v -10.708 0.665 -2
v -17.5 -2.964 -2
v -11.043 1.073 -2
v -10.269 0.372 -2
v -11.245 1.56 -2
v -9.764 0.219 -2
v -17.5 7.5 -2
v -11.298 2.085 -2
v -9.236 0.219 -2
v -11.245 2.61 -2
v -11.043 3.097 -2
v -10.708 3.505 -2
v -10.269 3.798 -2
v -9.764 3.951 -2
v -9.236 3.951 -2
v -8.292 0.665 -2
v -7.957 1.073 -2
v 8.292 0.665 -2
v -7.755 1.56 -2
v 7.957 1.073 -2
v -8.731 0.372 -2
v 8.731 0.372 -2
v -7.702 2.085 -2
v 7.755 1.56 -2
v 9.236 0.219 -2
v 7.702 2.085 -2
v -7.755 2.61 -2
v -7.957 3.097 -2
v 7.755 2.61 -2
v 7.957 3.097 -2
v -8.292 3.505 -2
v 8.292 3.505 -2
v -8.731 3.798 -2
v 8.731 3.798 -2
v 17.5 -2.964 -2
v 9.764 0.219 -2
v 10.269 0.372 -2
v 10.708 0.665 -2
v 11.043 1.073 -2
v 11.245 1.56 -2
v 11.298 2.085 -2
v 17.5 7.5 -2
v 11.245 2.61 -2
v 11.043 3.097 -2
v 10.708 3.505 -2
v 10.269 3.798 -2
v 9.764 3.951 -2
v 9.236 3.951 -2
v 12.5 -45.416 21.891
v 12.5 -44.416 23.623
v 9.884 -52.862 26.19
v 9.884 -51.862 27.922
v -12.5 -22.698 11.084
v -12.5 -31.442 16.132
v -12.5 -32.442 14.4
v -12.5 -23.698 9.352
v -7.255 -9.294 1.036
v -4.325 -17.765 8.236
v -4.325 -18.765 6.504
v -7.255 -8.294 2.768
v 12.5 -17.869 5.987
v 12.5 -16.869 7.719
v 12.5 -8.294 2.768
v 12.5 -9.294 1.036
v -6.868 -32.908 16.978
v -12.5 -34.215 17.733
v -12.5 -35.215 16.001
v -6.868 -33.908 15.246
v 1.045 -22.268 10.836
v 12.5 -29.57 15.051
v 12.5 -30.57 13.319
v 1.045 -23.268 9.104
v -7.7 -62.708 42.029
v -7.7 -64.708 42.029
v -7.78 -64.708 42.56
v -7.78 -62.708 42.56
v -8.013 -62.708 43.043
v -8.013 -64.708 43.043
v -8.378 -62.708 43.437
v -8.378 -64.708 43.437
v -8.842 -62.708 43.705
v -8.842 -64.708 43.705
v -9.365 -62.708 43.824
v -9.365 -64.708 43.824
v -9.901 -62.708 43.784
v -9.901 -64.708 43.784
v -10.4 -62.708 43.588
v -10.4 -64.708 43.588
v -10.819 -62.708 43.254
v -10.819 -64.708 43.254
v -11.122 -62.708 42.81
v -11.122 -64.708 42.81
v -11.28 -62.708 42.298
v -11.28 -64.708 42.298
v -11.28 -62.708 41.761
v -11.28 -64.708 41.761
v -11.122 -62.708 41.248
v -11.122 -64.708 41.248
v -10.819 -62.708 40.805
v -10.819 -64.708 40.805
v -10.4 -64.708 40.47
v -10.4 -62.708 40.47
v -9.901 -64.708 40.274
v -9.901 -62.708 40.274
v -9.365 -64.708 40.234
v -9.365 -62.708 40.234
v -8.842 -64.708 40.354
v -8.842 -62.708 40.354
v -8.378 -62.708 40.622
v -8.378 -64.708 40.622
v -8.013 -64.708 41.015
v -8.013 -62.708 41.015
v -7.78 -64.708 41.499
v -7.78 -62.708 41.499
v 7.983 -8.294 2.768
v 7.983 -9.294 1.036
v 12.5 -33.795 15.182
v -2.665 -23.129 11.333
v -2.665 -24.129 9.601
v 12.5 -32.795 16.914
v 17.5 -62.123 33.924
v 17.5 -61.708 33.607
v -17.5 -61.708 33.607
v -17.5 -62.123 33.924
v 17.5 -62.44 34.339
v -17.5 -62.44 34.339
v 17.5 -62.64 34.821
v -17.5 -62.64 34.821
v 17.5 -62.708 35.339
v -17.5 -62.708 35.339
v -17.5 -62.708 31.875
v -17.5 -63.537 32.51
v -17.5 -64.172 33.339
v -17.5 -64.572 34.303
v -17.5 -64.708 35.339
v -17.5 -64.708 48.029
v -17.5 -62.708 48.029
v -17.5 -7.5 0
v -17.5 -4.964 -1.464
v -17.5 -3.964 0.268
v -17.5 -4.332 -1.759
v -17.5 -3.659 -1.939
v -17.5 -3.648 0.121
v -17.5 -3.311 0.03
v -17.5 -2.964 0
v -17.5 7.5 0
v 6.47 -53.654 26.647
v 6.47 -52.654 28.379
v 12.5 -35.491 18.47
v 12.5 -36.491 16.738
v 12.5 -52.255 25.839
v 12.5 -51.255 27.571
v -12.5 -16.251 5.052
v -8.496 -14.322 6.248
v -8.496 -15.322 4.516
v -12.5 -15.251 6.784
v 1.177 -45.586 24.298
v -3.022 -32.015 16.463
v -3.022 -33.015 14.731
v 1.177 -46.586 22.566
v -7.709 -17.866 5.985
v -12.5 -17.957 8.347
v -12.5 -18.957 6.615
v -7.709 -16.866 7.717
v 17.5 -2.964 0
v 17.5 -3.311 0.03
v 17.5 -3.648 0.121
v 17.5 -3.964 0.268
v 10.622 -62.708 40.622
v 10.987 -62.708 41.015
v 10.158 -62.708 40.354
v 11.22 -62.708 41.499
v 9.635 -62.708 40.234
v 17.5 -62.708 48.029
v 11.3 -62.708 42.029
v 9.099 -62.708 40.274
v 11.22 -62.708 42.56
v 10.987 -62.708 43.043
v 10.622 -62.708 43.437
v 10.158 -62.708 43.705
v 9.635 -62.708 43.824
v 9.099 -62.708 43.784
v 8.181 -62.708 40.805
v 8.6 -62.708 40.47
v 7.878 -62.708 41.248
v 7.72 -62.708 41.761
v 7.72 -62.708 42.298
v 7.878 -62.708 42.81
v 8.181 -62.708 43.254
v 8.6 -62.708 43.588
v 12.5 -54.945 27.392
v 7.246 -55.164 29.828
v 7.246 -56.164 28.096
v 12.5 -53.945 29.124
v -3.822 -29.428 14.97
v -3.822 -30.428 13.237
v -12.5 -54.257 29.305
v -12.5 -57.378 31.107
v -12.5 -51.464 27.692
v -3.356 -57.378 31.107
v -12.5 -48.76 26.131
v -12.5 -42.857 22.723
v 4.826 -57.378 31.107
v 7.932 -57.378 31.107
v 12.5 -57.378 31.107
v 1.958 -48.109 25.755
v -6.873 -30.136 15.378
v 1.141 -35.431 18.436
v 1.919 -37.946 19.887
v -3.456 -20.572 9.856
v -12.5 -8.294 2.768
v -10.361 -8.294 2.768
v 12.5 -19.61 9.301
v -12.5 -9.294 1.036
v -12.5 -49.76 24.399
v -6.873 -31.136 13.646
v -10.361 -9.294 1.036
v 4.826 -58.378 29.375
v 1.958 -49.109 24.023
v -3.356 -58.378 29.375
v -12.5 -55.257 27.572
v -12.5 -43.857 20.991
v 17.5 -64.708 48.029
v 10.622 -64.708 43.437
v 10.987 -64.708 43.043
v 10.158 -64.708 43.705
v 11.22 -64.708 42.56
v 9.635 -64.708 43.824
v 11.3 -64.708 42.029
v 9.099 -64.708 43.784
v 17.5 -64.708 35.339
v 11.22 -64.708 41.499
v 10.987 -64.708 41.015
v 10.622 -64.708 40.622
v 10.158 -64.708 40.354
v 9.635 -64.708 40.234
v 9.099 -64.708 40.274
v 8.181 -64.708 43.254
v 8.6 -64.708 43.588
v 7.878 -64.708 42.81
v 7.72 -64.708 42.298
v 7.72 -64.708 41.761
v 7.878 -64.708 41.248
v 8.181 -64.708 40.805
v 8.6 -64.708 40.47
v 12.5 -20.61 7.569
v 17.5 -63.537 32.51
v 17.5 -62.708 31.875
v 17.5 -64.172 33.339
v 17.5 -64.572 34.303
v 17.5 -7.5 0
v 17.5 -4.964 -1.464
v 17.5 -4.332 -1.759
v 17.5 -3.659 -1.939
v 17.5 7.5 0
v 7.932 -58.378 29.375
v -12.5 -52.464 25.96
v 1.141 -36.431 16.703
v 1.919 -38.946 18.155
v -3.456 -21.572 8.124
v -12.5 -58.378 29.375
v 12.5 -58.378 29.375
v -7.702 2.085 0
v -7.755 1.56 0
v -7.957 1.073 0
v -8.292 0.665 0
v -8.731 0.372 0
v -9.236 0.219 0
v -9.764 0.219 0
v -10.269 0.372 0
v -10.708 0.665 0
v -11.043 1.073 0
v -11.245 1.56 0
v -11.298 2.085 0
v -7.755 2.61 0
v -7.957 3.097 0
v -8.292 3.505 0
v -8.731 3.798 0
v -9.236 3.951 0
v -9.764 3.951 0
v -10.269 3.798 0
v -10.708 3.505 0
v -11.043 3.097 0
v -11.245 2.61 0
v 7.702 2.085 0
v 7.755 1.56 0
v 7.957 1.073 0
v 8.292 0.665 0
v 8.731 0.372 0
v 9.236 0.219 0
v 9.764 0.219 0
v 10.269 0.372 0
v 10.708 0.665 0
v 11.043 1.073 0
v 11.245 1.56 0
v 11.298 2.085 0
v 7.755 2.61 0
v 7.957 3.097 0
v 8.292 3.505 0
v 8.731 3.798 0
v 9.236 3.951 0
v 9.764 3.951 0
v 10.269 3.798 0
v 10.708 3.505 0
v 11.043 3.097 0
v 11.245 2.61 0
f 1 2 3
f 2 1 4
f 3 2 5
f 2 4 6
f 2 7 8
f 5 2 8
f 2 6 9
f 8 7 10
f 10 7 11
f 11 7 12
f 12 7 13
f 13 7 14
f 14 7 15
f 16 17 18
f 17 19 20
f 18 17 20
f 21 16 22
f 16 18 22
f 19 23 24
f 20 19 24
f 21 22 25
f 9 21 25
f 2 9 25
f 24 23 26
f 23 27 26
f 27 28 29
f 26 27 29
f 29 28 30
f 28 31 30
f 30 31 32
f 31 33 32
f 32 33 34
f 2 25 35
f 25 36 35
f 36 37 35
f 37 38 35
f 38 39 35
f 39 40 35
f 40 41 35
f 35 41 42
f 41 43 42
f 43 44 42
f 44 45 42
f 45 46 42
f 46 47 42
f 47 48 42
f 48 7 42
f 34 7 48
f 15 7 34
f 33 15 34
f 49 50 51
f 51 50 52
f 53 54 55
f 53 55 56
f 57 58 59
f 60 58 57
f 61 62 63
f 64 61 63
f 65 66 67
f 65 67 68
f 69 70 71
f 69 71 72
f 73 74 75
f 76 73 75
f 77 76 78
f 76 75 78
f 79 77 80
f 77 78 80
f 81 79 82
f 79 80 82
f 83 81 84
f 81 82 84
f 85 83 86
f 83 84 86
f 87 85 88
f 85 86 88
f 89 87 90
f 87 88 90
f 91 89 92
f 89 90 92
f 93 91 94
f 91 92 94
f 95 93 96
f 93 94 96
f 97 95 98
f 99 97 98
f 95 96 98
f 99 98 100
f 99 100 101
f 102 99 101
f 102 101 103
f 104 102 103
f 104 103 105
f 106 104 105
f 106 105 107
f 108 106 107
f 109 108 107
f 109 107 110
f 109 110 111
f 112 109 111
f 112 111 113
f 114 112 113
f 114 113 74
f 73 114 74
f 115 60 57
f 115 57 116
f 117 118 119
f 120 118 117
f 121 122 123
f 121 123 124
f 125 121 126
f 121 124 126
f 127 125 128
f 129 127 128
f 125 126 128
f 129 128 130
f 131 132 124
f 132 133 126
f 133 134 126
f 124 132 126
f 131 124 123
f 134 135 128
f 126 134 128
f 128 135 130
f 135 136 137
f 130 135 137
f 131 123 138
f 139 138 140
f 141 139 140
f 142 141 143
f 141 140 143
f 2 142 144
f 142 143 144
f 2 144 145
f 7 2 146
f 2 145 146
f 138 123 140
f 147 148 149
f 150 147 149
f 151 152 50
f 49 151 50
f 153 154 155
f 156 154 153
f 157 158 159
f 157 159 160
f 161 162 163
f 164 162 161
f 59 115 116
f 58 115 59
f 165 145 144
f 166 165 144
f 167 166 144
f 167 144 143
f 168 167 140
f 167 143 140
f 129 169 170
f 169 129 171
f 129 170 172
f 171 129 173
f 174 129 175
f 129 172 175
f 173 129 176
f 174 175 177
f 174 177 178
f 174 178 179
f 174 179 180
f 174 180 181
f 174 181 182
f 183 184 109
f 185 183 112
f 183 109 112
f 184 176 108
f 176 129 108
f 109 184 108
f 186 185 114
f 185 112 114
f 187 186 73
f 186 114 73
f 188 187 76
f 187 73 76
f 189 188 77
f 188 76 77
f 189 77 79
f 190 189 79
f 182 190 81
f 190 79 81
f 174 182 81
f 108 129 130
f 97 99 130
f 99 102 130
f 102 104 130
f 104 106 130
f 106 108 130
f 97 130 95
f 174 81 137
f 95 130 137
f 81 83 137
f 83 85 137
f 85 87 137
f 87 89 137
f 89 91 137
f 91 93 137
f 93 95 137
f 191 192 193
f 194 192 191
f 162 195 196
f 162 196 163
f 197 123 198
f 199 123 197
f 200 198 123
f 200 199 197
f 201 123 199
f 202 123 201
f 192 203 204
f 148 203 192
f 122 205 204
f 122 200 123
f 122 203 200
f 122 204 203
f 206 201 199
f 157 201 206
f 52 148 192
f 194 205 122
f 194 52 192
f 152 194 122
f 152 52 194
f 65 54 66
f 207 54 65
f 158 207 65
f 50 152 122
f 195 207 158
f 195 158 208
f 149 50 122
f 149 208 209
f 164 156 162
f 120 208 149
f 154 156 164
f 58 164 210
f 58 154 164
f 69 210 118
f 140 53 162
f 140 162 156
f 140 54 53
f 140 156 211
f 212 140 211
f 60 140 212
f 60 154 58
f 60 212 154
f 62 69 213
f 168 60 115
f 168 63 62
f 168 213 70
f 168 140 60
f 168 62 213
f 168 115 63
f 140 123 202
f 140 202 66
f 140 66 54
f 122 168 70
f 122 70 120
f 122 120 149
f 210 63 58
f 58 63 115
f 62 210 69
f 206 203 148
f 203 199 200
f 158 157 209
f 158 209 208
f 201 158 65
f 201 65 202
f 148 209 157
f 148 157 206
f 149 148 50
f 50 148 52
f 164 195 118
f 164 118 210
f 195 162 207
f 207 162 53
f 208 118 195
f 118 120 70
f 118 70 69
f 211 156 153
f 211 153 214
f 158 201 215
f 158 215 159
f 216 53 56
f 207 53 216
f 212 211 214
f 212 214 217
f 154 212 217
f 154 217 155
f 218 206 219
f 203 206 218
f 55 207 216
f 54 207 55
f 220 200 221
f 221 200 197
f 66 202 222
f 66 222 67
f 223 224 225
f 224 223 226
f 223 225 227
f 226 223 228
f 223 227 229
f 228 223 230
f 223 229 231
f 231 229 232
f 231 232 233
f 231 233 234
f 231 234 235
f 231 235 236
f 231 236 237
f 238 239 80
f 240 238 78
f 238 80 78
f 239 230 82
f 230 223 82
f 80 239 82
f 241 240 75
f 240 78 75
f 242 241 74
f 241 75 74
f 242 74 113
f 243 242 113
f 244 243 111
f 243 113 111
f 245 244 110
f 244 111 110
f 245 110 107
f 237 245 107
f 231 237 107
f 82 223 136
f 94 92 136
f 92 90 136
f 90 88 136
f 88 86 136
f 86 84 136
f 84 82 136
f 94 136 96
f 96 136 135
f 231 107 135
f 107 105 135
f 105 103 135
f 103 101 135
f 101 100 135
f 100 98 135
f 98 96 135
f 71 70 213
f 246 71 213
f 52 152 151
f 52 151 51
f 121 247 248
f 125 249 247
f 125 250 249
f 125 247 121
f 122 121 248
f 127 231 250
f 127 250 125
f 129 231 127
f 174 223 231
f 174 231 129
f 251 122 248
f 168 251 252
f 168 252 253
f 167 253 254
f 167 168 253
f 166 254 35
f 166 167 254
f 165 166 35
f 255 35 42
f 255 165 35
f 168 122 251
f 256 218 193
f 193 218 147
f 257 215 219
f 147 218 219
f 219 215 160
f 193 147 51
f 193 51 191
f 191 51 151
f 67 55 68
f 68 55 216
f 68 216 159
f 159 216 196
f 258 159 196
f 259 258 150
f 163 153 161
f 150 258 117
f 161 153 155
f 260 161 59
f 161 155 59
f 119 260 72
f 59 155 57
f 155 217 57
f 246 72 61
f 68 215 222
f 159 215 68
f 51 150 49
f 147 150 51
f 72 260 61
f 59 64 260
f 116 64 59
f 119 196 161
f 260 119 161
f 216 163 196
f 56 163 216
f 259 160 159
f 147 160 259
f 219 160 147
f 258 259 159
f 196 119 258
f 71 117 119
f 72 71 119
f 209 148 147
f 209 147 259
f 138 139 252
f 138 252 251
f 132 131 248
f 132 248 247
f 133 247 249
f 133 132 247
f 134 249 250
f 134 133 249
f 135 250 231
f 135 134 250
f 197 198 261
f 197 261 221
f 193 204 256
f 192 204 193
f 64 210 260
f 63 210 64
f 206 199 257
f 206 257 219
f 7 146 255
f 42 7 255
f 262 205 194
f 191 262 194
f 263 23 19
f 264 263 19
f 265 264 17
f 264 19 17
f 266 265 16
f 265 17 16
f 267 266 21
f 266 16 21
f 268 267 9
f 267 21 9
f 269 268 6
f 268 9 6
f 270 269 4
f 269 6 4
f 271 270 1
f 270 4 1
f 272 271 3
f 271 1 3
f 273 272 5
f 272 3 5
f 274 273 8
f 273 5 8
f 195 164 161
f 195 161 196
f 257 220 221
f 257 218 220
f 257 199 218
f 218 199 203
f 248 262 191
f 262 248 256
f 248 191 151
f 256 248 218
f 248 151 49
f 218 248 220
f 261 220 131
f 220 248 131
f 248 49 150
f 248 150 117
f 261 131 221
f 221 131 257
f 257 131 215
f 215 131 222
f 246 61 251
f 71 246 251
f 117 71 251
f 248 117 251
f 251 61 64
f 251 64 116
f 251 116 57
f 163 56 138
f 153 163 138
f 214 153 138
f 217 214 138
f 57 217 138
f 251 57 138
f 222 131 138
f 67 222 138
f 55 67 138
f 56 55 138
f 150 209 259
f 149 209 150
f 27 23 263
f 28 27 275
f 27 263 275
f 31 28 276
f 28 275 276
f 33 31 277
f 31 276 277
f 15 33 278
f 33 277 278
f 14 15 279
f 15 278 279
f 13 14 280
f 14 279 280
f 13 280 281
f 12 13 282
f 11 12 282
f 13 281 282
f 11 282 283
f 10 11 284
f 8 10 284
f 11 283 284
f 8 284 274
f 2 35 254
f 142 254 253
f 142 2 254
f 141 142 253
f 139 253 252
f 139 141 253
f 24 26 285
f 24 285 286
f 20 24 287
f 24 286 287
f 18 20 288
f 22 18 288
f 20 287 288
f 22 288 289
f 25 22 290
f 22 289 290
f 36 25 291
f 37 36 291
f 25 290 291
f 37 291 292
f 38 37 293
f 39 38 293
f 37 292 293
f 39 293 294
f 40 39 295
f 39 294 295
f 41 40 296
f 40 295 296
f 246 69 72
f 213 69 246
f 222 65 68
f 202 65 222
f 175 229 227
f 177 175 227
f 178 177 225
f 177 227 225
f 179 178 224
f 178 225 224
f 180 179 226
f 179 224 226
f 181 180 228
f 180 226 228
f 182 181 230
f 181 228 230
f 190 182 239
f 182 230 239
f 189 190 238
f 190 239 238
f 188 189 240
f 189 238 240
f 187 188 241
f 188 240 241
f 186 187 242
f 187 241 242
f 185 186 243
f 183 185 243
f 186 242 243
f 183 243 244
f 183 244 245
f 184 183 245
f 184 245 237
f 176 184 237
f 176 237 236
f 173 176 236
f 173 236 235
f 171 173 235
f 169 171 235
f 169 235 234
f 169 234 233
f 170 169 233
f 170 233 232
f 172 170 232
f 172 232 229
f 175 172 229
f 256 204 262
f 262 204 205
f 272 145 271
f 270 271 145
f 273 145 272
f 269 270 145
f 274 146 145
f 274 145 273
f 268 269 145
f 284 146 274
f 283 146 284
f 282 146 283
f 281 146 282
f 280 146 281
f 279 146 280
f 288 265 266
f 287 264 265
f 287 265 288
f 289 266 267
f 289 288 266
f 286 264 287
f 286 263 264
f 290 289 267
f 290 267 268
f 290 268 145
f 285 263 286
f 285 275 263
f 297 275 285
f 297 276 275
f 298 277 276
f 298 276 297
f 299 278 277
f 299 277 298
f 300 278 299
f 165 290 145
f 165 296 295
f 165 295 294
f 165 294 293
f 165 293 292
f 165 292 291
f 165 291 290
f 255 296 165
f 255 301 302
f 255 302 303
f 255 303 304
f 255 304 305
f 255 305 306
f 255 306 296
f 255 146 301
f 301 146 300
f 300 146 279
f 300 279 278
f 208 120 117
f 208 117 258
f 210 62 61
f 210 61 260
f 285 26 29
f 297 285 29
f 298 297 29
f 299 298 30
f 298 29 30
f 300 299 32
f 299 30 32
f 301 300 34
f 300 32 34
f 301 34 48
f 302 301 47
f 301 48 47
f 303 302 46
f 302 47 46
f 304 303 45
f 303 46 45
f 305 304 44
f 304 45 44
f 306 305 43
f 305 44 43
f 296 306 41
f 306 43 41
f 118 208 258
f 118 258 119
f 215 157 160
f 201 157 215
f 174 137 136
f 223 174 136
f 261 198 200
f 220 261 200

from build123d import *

# Parameters (mm, degrees)
SKETCH1_W            = 35
SKETCH1_H            = 15
BASE_FLANGE1_DEPTH   = 2
EDGE_FLANGE1_START   = -17.5
EDGE_FLANGE1_DEPTH   = 35
EDGE_FLANGE1_2_DEPTH = 35
EDGE_FLANGE2_START   = -17.5
EDGE_FLANGE2_DEPTH   = 35
EDGE_FLANGE2_2_DEPTH = 35
SKETCH8_W            = 25
SKETCH8_H            = 56.677305051
CUT_EXTRUDE1_DEPTH   = 10
BOSS_EXTRUDE1_DEPTH  = 2
BOSS_EXTRUDE2_DEPTH  = 2
M3_CLEARANCE_HOLE1_D = 3.6
M3_CLEARANCE_HOLE2_D = 3.6
M3_CLEARANCE_HOLE3_D = 3.6
M3_CLEARANCE_HOLE4_D = 3.6


# Read off the part's stored shape, not the designer's step: Edge-Flange1, Edge-Flange2
# Sheet-metal steps are written as plain solids
with BuildPart() as part:
    # Sketch1 → Base-Flange1 (new body)
    with BuildSketch(Plane.XY):
        Rectangle(SKETCH1_W, SKETCH1_H)
    extrude(amount=-BASE_FLANGE1_DEPTH)

    # Edge-Flange1 outline → Edge-Flange1 (cut)
    with BuildSketch(Plane.YZ.offset(EDGE_FLANGE1_START)):
        with BuildLine():
            ThreePointArc((-2.964101615, -2), (-3.999377795, -1.863703305), (-4.964101615, -1.464101615))
            Line((-4.964101615, -1.464101615), (-7.5, 0))
            Line((-7.5, 0), (-7.5, -2))
            Line((-7.5, -2), (-2.964101615, -2))
        make_face()
    extrude(amount=EDGE_FLANGE1_DEPTH, mode=Mode.SUBTRACT)

    # Edge-Flange1 2 outline → Edge-Flange1 2 (add)
    with BuildSketch(Plane.YZ.offset(EDGE_FLANGE1_START)):
        with BuildLine():
            Line((-65.708341645, 33.606601718), (-7.5, 0))
            Line((-7.5, 0), (-2.964101615, 0))
            ThreePointArc((-2.964101615, 0), (-3.481739705, 0.068148347), (-3.964101615, 0.267949192))
            Line((-3.964101615, 0.267949192), (-64.708341645, 35.338652525))
            Line((-64.708341645, 35.338652525), (-65.708341645, 33.606601718))
        make_face()
    extrude(amount=EDGE_FLANGE1_2_DEPTH)

    # Edge-Flange2 outline → Edge-Flange2 (cut)
    with BuildSketch(Plane.YZ.offset(EDGE_FLANGE2_START)):
        with BuildLine():
            ThreePointArc((-62.708341645, 31.87455091), (-64.17244326, 33.338652525), (-64.708341645, 35.338652525))
            Line((-64.708341645, 35.338652525), (-65.708341645, 33.606601718))
            Line((-65.708341645, 33.606601718), (-62.708341645, 31.87455091))
        make_face()
    extrude(amount=EDGE_FLANGE2_DEPTH, mode=Mode.SUBTRACT)

    # Edge-Flange2 2 outline → Edge-Flange2 2 (add)
    with BuildSketch(Plane.YZ.offset(EDGE_FLANGE2_START)):
        with BuildLine():
            Line((-64.708341645, 48.029251449), (-64.708341645, 35.338652525))
            Line((-64.708341645, 35.338652525), (-61.708341645, 33.606601718))
            ThreePointArc((-61.708341645, 33.606601718), (-62.440392453, 34.338652525), (-62.708341645, 35.338652525))
            Line((-62.708341645, 35.338652525), (-62.708341645, 48.029251449))
            Line((-62.708341645, 48.029251449), (-64.708341645, 48.029251449))
        make_face()
    extrude(amount=EDGE_FLANGE2_2_DEPTH)

    # Sketch8 → Cut-Extrude1 (cut)
    with BuildSketch(Plane(origin=(0, -0.875, -1.515544457), x_dir=(1, 0, 0), z_dir=(0, 0.499999999999995, 0.8660254037844416))):
        with Locations((0, -36.905639824)):
            Rectangle(SKETCH8_W, SKETCH8_H)
    extrude(amount=-CUT_EXTRUDE1_DEPTH, mode=Mode.SUBTRACT)

    # Sketch9 → Boss-Extrude1 (add)
    with BuildSketch(Plane(origin=(0, -0.875, -1.515544457), x_dir=(1, 0, 0), z_dir=(0, 0.499999999999995, 0.8660254037844416))):
        Polygon((8.83956854, -68.632858088), (7.246458748, -62.687291403), (15.857586038, -60.3799468), (15.081128903, -57.482169321), (6.470001613, -59.789513924), (1.919269462, -42.805950327), (15.365688048, -39.202993325), (14.946719777, -36.202993325), (1.14120391, -39.902170153), (-2.665166674, -25.696601742), (16.123001013, -20.662327383), (15.50761088, -17.662327383), (-3.456389996, -22.743716103), (-8.33426209, -4.539249615), (-11.232039569, -5.31570675), (-8.495960417, -15.52689316), (-17.05592393, -17.82052847), (-16.279466794, -20.718305949), (-7.708625485, -18.465267128), (-3.822054178, -32.970148713), (-15.793222539, -36.177813607), (-15.040127716, -39.177813607), (-3.021606391, -35.957460524), (1.177204702, -51.627636855), (-15.406874361, -56.071327447), (-14.947395895, -59.071327447), (1.957983923, -54.541544577), (5.941791061, -69.409315224), align=None)
    extrude(amount=-BOSS_EXTRUDE1_DEPTH)

    # Sketch10 → Boss-Extrude2 (add)
    with BuildSketch(Plane(origin=(0, -0.875, -1.515544457), x_dir=(1, 0, 0), z_dir=(0, 0.499999999999995, 0.8660254037844416))):
        Polygon((-3.456389996, -22.743716103), (12.5, -8.566987298), (10.507436864, -6.324289782), (-5.448953132, -20.501018587), align=None)
        Polygon((-2.665166674, -25.696601742), (12.5, -36.858589914), (14.278322137, -34.442483464), (-0.886844536, -23.280495293), align=None)
        Polygon((-3.822054178, -32.970148713), (-12.5, -19.724787915), (-15.00938766, -21.368860167), (-6.331441838, -34.614220965), align=None)
        Polygon((-12.5, -55.29243281), (-3.021606391, -35.957460524), (-5.715342898, -34.636936526), (-15.193736507, -53.971908812), align=None)
        Polygon((6.470001613, -59.789513924), (12.5, -39.970852124), (15.37009296, -40.844102603), (9.340094573, -60.662764404), align=None)
        Polygon((-12.5, -58.415549694), (4.825776546, -65.244292349), (3.725723751, -68.035328689), (-13.600052794, -61.206586033), align=None)
    extrude(amount=-BOSS_EXTRUDE2_DEPTH)

    # M3 Clearance Hole1 (through all)
    with Locations(Plane(origin=(-15.830402425, -63.569767603, -87), x_dir=(-1, 0, 0), z_dir=(0, 0, -1))):
        with Locations((-25.330402425, 65.569767603), (-6.330402425, 65.739876607)):
            Hole(M3_CLEARANCE_HOLE1_D / 2)

    # M3 Clearance Hole2 (through all)
    with Locations(Plane(origin=(15.830402425, -63.569767603, 0), x_dir=(1, 0, 0), z_dir=(0, 0, 1))):
        with Locations((-25.330402425, 65.569767603), (-6.330402425, 65.739876607)):
            Hole(M3_CLEARANCE_HOLE2_D / 2)

    # M3 Clearance Hole3 (through all)
    with Locations(Plane(origin=(15.830402425, -62.708341645, 22.375161803), x_dir=(-1, 0, 0), z_dir=(0, 1, 0))):
        with Locations((25.330402425, 19.654089646), (6.330402425, 19.654089646)):
            Hole(M3_CLEARANCE_HOLE3_D / 2)

    # M3 Clearance Hole4 (through all)
    with Locations(Plane(origin=(-15.830402425, -62.708341645, -109.375161803), x_dir=(1, 0, 0), z_dir=(0, 1, 0))):
        with Locations((25.330402425, -151.404413252), (6.330402425, -151.404413252)):
            Hole(M3_CLEARANCE_HOLE4_D / 2)


solid = part.part
